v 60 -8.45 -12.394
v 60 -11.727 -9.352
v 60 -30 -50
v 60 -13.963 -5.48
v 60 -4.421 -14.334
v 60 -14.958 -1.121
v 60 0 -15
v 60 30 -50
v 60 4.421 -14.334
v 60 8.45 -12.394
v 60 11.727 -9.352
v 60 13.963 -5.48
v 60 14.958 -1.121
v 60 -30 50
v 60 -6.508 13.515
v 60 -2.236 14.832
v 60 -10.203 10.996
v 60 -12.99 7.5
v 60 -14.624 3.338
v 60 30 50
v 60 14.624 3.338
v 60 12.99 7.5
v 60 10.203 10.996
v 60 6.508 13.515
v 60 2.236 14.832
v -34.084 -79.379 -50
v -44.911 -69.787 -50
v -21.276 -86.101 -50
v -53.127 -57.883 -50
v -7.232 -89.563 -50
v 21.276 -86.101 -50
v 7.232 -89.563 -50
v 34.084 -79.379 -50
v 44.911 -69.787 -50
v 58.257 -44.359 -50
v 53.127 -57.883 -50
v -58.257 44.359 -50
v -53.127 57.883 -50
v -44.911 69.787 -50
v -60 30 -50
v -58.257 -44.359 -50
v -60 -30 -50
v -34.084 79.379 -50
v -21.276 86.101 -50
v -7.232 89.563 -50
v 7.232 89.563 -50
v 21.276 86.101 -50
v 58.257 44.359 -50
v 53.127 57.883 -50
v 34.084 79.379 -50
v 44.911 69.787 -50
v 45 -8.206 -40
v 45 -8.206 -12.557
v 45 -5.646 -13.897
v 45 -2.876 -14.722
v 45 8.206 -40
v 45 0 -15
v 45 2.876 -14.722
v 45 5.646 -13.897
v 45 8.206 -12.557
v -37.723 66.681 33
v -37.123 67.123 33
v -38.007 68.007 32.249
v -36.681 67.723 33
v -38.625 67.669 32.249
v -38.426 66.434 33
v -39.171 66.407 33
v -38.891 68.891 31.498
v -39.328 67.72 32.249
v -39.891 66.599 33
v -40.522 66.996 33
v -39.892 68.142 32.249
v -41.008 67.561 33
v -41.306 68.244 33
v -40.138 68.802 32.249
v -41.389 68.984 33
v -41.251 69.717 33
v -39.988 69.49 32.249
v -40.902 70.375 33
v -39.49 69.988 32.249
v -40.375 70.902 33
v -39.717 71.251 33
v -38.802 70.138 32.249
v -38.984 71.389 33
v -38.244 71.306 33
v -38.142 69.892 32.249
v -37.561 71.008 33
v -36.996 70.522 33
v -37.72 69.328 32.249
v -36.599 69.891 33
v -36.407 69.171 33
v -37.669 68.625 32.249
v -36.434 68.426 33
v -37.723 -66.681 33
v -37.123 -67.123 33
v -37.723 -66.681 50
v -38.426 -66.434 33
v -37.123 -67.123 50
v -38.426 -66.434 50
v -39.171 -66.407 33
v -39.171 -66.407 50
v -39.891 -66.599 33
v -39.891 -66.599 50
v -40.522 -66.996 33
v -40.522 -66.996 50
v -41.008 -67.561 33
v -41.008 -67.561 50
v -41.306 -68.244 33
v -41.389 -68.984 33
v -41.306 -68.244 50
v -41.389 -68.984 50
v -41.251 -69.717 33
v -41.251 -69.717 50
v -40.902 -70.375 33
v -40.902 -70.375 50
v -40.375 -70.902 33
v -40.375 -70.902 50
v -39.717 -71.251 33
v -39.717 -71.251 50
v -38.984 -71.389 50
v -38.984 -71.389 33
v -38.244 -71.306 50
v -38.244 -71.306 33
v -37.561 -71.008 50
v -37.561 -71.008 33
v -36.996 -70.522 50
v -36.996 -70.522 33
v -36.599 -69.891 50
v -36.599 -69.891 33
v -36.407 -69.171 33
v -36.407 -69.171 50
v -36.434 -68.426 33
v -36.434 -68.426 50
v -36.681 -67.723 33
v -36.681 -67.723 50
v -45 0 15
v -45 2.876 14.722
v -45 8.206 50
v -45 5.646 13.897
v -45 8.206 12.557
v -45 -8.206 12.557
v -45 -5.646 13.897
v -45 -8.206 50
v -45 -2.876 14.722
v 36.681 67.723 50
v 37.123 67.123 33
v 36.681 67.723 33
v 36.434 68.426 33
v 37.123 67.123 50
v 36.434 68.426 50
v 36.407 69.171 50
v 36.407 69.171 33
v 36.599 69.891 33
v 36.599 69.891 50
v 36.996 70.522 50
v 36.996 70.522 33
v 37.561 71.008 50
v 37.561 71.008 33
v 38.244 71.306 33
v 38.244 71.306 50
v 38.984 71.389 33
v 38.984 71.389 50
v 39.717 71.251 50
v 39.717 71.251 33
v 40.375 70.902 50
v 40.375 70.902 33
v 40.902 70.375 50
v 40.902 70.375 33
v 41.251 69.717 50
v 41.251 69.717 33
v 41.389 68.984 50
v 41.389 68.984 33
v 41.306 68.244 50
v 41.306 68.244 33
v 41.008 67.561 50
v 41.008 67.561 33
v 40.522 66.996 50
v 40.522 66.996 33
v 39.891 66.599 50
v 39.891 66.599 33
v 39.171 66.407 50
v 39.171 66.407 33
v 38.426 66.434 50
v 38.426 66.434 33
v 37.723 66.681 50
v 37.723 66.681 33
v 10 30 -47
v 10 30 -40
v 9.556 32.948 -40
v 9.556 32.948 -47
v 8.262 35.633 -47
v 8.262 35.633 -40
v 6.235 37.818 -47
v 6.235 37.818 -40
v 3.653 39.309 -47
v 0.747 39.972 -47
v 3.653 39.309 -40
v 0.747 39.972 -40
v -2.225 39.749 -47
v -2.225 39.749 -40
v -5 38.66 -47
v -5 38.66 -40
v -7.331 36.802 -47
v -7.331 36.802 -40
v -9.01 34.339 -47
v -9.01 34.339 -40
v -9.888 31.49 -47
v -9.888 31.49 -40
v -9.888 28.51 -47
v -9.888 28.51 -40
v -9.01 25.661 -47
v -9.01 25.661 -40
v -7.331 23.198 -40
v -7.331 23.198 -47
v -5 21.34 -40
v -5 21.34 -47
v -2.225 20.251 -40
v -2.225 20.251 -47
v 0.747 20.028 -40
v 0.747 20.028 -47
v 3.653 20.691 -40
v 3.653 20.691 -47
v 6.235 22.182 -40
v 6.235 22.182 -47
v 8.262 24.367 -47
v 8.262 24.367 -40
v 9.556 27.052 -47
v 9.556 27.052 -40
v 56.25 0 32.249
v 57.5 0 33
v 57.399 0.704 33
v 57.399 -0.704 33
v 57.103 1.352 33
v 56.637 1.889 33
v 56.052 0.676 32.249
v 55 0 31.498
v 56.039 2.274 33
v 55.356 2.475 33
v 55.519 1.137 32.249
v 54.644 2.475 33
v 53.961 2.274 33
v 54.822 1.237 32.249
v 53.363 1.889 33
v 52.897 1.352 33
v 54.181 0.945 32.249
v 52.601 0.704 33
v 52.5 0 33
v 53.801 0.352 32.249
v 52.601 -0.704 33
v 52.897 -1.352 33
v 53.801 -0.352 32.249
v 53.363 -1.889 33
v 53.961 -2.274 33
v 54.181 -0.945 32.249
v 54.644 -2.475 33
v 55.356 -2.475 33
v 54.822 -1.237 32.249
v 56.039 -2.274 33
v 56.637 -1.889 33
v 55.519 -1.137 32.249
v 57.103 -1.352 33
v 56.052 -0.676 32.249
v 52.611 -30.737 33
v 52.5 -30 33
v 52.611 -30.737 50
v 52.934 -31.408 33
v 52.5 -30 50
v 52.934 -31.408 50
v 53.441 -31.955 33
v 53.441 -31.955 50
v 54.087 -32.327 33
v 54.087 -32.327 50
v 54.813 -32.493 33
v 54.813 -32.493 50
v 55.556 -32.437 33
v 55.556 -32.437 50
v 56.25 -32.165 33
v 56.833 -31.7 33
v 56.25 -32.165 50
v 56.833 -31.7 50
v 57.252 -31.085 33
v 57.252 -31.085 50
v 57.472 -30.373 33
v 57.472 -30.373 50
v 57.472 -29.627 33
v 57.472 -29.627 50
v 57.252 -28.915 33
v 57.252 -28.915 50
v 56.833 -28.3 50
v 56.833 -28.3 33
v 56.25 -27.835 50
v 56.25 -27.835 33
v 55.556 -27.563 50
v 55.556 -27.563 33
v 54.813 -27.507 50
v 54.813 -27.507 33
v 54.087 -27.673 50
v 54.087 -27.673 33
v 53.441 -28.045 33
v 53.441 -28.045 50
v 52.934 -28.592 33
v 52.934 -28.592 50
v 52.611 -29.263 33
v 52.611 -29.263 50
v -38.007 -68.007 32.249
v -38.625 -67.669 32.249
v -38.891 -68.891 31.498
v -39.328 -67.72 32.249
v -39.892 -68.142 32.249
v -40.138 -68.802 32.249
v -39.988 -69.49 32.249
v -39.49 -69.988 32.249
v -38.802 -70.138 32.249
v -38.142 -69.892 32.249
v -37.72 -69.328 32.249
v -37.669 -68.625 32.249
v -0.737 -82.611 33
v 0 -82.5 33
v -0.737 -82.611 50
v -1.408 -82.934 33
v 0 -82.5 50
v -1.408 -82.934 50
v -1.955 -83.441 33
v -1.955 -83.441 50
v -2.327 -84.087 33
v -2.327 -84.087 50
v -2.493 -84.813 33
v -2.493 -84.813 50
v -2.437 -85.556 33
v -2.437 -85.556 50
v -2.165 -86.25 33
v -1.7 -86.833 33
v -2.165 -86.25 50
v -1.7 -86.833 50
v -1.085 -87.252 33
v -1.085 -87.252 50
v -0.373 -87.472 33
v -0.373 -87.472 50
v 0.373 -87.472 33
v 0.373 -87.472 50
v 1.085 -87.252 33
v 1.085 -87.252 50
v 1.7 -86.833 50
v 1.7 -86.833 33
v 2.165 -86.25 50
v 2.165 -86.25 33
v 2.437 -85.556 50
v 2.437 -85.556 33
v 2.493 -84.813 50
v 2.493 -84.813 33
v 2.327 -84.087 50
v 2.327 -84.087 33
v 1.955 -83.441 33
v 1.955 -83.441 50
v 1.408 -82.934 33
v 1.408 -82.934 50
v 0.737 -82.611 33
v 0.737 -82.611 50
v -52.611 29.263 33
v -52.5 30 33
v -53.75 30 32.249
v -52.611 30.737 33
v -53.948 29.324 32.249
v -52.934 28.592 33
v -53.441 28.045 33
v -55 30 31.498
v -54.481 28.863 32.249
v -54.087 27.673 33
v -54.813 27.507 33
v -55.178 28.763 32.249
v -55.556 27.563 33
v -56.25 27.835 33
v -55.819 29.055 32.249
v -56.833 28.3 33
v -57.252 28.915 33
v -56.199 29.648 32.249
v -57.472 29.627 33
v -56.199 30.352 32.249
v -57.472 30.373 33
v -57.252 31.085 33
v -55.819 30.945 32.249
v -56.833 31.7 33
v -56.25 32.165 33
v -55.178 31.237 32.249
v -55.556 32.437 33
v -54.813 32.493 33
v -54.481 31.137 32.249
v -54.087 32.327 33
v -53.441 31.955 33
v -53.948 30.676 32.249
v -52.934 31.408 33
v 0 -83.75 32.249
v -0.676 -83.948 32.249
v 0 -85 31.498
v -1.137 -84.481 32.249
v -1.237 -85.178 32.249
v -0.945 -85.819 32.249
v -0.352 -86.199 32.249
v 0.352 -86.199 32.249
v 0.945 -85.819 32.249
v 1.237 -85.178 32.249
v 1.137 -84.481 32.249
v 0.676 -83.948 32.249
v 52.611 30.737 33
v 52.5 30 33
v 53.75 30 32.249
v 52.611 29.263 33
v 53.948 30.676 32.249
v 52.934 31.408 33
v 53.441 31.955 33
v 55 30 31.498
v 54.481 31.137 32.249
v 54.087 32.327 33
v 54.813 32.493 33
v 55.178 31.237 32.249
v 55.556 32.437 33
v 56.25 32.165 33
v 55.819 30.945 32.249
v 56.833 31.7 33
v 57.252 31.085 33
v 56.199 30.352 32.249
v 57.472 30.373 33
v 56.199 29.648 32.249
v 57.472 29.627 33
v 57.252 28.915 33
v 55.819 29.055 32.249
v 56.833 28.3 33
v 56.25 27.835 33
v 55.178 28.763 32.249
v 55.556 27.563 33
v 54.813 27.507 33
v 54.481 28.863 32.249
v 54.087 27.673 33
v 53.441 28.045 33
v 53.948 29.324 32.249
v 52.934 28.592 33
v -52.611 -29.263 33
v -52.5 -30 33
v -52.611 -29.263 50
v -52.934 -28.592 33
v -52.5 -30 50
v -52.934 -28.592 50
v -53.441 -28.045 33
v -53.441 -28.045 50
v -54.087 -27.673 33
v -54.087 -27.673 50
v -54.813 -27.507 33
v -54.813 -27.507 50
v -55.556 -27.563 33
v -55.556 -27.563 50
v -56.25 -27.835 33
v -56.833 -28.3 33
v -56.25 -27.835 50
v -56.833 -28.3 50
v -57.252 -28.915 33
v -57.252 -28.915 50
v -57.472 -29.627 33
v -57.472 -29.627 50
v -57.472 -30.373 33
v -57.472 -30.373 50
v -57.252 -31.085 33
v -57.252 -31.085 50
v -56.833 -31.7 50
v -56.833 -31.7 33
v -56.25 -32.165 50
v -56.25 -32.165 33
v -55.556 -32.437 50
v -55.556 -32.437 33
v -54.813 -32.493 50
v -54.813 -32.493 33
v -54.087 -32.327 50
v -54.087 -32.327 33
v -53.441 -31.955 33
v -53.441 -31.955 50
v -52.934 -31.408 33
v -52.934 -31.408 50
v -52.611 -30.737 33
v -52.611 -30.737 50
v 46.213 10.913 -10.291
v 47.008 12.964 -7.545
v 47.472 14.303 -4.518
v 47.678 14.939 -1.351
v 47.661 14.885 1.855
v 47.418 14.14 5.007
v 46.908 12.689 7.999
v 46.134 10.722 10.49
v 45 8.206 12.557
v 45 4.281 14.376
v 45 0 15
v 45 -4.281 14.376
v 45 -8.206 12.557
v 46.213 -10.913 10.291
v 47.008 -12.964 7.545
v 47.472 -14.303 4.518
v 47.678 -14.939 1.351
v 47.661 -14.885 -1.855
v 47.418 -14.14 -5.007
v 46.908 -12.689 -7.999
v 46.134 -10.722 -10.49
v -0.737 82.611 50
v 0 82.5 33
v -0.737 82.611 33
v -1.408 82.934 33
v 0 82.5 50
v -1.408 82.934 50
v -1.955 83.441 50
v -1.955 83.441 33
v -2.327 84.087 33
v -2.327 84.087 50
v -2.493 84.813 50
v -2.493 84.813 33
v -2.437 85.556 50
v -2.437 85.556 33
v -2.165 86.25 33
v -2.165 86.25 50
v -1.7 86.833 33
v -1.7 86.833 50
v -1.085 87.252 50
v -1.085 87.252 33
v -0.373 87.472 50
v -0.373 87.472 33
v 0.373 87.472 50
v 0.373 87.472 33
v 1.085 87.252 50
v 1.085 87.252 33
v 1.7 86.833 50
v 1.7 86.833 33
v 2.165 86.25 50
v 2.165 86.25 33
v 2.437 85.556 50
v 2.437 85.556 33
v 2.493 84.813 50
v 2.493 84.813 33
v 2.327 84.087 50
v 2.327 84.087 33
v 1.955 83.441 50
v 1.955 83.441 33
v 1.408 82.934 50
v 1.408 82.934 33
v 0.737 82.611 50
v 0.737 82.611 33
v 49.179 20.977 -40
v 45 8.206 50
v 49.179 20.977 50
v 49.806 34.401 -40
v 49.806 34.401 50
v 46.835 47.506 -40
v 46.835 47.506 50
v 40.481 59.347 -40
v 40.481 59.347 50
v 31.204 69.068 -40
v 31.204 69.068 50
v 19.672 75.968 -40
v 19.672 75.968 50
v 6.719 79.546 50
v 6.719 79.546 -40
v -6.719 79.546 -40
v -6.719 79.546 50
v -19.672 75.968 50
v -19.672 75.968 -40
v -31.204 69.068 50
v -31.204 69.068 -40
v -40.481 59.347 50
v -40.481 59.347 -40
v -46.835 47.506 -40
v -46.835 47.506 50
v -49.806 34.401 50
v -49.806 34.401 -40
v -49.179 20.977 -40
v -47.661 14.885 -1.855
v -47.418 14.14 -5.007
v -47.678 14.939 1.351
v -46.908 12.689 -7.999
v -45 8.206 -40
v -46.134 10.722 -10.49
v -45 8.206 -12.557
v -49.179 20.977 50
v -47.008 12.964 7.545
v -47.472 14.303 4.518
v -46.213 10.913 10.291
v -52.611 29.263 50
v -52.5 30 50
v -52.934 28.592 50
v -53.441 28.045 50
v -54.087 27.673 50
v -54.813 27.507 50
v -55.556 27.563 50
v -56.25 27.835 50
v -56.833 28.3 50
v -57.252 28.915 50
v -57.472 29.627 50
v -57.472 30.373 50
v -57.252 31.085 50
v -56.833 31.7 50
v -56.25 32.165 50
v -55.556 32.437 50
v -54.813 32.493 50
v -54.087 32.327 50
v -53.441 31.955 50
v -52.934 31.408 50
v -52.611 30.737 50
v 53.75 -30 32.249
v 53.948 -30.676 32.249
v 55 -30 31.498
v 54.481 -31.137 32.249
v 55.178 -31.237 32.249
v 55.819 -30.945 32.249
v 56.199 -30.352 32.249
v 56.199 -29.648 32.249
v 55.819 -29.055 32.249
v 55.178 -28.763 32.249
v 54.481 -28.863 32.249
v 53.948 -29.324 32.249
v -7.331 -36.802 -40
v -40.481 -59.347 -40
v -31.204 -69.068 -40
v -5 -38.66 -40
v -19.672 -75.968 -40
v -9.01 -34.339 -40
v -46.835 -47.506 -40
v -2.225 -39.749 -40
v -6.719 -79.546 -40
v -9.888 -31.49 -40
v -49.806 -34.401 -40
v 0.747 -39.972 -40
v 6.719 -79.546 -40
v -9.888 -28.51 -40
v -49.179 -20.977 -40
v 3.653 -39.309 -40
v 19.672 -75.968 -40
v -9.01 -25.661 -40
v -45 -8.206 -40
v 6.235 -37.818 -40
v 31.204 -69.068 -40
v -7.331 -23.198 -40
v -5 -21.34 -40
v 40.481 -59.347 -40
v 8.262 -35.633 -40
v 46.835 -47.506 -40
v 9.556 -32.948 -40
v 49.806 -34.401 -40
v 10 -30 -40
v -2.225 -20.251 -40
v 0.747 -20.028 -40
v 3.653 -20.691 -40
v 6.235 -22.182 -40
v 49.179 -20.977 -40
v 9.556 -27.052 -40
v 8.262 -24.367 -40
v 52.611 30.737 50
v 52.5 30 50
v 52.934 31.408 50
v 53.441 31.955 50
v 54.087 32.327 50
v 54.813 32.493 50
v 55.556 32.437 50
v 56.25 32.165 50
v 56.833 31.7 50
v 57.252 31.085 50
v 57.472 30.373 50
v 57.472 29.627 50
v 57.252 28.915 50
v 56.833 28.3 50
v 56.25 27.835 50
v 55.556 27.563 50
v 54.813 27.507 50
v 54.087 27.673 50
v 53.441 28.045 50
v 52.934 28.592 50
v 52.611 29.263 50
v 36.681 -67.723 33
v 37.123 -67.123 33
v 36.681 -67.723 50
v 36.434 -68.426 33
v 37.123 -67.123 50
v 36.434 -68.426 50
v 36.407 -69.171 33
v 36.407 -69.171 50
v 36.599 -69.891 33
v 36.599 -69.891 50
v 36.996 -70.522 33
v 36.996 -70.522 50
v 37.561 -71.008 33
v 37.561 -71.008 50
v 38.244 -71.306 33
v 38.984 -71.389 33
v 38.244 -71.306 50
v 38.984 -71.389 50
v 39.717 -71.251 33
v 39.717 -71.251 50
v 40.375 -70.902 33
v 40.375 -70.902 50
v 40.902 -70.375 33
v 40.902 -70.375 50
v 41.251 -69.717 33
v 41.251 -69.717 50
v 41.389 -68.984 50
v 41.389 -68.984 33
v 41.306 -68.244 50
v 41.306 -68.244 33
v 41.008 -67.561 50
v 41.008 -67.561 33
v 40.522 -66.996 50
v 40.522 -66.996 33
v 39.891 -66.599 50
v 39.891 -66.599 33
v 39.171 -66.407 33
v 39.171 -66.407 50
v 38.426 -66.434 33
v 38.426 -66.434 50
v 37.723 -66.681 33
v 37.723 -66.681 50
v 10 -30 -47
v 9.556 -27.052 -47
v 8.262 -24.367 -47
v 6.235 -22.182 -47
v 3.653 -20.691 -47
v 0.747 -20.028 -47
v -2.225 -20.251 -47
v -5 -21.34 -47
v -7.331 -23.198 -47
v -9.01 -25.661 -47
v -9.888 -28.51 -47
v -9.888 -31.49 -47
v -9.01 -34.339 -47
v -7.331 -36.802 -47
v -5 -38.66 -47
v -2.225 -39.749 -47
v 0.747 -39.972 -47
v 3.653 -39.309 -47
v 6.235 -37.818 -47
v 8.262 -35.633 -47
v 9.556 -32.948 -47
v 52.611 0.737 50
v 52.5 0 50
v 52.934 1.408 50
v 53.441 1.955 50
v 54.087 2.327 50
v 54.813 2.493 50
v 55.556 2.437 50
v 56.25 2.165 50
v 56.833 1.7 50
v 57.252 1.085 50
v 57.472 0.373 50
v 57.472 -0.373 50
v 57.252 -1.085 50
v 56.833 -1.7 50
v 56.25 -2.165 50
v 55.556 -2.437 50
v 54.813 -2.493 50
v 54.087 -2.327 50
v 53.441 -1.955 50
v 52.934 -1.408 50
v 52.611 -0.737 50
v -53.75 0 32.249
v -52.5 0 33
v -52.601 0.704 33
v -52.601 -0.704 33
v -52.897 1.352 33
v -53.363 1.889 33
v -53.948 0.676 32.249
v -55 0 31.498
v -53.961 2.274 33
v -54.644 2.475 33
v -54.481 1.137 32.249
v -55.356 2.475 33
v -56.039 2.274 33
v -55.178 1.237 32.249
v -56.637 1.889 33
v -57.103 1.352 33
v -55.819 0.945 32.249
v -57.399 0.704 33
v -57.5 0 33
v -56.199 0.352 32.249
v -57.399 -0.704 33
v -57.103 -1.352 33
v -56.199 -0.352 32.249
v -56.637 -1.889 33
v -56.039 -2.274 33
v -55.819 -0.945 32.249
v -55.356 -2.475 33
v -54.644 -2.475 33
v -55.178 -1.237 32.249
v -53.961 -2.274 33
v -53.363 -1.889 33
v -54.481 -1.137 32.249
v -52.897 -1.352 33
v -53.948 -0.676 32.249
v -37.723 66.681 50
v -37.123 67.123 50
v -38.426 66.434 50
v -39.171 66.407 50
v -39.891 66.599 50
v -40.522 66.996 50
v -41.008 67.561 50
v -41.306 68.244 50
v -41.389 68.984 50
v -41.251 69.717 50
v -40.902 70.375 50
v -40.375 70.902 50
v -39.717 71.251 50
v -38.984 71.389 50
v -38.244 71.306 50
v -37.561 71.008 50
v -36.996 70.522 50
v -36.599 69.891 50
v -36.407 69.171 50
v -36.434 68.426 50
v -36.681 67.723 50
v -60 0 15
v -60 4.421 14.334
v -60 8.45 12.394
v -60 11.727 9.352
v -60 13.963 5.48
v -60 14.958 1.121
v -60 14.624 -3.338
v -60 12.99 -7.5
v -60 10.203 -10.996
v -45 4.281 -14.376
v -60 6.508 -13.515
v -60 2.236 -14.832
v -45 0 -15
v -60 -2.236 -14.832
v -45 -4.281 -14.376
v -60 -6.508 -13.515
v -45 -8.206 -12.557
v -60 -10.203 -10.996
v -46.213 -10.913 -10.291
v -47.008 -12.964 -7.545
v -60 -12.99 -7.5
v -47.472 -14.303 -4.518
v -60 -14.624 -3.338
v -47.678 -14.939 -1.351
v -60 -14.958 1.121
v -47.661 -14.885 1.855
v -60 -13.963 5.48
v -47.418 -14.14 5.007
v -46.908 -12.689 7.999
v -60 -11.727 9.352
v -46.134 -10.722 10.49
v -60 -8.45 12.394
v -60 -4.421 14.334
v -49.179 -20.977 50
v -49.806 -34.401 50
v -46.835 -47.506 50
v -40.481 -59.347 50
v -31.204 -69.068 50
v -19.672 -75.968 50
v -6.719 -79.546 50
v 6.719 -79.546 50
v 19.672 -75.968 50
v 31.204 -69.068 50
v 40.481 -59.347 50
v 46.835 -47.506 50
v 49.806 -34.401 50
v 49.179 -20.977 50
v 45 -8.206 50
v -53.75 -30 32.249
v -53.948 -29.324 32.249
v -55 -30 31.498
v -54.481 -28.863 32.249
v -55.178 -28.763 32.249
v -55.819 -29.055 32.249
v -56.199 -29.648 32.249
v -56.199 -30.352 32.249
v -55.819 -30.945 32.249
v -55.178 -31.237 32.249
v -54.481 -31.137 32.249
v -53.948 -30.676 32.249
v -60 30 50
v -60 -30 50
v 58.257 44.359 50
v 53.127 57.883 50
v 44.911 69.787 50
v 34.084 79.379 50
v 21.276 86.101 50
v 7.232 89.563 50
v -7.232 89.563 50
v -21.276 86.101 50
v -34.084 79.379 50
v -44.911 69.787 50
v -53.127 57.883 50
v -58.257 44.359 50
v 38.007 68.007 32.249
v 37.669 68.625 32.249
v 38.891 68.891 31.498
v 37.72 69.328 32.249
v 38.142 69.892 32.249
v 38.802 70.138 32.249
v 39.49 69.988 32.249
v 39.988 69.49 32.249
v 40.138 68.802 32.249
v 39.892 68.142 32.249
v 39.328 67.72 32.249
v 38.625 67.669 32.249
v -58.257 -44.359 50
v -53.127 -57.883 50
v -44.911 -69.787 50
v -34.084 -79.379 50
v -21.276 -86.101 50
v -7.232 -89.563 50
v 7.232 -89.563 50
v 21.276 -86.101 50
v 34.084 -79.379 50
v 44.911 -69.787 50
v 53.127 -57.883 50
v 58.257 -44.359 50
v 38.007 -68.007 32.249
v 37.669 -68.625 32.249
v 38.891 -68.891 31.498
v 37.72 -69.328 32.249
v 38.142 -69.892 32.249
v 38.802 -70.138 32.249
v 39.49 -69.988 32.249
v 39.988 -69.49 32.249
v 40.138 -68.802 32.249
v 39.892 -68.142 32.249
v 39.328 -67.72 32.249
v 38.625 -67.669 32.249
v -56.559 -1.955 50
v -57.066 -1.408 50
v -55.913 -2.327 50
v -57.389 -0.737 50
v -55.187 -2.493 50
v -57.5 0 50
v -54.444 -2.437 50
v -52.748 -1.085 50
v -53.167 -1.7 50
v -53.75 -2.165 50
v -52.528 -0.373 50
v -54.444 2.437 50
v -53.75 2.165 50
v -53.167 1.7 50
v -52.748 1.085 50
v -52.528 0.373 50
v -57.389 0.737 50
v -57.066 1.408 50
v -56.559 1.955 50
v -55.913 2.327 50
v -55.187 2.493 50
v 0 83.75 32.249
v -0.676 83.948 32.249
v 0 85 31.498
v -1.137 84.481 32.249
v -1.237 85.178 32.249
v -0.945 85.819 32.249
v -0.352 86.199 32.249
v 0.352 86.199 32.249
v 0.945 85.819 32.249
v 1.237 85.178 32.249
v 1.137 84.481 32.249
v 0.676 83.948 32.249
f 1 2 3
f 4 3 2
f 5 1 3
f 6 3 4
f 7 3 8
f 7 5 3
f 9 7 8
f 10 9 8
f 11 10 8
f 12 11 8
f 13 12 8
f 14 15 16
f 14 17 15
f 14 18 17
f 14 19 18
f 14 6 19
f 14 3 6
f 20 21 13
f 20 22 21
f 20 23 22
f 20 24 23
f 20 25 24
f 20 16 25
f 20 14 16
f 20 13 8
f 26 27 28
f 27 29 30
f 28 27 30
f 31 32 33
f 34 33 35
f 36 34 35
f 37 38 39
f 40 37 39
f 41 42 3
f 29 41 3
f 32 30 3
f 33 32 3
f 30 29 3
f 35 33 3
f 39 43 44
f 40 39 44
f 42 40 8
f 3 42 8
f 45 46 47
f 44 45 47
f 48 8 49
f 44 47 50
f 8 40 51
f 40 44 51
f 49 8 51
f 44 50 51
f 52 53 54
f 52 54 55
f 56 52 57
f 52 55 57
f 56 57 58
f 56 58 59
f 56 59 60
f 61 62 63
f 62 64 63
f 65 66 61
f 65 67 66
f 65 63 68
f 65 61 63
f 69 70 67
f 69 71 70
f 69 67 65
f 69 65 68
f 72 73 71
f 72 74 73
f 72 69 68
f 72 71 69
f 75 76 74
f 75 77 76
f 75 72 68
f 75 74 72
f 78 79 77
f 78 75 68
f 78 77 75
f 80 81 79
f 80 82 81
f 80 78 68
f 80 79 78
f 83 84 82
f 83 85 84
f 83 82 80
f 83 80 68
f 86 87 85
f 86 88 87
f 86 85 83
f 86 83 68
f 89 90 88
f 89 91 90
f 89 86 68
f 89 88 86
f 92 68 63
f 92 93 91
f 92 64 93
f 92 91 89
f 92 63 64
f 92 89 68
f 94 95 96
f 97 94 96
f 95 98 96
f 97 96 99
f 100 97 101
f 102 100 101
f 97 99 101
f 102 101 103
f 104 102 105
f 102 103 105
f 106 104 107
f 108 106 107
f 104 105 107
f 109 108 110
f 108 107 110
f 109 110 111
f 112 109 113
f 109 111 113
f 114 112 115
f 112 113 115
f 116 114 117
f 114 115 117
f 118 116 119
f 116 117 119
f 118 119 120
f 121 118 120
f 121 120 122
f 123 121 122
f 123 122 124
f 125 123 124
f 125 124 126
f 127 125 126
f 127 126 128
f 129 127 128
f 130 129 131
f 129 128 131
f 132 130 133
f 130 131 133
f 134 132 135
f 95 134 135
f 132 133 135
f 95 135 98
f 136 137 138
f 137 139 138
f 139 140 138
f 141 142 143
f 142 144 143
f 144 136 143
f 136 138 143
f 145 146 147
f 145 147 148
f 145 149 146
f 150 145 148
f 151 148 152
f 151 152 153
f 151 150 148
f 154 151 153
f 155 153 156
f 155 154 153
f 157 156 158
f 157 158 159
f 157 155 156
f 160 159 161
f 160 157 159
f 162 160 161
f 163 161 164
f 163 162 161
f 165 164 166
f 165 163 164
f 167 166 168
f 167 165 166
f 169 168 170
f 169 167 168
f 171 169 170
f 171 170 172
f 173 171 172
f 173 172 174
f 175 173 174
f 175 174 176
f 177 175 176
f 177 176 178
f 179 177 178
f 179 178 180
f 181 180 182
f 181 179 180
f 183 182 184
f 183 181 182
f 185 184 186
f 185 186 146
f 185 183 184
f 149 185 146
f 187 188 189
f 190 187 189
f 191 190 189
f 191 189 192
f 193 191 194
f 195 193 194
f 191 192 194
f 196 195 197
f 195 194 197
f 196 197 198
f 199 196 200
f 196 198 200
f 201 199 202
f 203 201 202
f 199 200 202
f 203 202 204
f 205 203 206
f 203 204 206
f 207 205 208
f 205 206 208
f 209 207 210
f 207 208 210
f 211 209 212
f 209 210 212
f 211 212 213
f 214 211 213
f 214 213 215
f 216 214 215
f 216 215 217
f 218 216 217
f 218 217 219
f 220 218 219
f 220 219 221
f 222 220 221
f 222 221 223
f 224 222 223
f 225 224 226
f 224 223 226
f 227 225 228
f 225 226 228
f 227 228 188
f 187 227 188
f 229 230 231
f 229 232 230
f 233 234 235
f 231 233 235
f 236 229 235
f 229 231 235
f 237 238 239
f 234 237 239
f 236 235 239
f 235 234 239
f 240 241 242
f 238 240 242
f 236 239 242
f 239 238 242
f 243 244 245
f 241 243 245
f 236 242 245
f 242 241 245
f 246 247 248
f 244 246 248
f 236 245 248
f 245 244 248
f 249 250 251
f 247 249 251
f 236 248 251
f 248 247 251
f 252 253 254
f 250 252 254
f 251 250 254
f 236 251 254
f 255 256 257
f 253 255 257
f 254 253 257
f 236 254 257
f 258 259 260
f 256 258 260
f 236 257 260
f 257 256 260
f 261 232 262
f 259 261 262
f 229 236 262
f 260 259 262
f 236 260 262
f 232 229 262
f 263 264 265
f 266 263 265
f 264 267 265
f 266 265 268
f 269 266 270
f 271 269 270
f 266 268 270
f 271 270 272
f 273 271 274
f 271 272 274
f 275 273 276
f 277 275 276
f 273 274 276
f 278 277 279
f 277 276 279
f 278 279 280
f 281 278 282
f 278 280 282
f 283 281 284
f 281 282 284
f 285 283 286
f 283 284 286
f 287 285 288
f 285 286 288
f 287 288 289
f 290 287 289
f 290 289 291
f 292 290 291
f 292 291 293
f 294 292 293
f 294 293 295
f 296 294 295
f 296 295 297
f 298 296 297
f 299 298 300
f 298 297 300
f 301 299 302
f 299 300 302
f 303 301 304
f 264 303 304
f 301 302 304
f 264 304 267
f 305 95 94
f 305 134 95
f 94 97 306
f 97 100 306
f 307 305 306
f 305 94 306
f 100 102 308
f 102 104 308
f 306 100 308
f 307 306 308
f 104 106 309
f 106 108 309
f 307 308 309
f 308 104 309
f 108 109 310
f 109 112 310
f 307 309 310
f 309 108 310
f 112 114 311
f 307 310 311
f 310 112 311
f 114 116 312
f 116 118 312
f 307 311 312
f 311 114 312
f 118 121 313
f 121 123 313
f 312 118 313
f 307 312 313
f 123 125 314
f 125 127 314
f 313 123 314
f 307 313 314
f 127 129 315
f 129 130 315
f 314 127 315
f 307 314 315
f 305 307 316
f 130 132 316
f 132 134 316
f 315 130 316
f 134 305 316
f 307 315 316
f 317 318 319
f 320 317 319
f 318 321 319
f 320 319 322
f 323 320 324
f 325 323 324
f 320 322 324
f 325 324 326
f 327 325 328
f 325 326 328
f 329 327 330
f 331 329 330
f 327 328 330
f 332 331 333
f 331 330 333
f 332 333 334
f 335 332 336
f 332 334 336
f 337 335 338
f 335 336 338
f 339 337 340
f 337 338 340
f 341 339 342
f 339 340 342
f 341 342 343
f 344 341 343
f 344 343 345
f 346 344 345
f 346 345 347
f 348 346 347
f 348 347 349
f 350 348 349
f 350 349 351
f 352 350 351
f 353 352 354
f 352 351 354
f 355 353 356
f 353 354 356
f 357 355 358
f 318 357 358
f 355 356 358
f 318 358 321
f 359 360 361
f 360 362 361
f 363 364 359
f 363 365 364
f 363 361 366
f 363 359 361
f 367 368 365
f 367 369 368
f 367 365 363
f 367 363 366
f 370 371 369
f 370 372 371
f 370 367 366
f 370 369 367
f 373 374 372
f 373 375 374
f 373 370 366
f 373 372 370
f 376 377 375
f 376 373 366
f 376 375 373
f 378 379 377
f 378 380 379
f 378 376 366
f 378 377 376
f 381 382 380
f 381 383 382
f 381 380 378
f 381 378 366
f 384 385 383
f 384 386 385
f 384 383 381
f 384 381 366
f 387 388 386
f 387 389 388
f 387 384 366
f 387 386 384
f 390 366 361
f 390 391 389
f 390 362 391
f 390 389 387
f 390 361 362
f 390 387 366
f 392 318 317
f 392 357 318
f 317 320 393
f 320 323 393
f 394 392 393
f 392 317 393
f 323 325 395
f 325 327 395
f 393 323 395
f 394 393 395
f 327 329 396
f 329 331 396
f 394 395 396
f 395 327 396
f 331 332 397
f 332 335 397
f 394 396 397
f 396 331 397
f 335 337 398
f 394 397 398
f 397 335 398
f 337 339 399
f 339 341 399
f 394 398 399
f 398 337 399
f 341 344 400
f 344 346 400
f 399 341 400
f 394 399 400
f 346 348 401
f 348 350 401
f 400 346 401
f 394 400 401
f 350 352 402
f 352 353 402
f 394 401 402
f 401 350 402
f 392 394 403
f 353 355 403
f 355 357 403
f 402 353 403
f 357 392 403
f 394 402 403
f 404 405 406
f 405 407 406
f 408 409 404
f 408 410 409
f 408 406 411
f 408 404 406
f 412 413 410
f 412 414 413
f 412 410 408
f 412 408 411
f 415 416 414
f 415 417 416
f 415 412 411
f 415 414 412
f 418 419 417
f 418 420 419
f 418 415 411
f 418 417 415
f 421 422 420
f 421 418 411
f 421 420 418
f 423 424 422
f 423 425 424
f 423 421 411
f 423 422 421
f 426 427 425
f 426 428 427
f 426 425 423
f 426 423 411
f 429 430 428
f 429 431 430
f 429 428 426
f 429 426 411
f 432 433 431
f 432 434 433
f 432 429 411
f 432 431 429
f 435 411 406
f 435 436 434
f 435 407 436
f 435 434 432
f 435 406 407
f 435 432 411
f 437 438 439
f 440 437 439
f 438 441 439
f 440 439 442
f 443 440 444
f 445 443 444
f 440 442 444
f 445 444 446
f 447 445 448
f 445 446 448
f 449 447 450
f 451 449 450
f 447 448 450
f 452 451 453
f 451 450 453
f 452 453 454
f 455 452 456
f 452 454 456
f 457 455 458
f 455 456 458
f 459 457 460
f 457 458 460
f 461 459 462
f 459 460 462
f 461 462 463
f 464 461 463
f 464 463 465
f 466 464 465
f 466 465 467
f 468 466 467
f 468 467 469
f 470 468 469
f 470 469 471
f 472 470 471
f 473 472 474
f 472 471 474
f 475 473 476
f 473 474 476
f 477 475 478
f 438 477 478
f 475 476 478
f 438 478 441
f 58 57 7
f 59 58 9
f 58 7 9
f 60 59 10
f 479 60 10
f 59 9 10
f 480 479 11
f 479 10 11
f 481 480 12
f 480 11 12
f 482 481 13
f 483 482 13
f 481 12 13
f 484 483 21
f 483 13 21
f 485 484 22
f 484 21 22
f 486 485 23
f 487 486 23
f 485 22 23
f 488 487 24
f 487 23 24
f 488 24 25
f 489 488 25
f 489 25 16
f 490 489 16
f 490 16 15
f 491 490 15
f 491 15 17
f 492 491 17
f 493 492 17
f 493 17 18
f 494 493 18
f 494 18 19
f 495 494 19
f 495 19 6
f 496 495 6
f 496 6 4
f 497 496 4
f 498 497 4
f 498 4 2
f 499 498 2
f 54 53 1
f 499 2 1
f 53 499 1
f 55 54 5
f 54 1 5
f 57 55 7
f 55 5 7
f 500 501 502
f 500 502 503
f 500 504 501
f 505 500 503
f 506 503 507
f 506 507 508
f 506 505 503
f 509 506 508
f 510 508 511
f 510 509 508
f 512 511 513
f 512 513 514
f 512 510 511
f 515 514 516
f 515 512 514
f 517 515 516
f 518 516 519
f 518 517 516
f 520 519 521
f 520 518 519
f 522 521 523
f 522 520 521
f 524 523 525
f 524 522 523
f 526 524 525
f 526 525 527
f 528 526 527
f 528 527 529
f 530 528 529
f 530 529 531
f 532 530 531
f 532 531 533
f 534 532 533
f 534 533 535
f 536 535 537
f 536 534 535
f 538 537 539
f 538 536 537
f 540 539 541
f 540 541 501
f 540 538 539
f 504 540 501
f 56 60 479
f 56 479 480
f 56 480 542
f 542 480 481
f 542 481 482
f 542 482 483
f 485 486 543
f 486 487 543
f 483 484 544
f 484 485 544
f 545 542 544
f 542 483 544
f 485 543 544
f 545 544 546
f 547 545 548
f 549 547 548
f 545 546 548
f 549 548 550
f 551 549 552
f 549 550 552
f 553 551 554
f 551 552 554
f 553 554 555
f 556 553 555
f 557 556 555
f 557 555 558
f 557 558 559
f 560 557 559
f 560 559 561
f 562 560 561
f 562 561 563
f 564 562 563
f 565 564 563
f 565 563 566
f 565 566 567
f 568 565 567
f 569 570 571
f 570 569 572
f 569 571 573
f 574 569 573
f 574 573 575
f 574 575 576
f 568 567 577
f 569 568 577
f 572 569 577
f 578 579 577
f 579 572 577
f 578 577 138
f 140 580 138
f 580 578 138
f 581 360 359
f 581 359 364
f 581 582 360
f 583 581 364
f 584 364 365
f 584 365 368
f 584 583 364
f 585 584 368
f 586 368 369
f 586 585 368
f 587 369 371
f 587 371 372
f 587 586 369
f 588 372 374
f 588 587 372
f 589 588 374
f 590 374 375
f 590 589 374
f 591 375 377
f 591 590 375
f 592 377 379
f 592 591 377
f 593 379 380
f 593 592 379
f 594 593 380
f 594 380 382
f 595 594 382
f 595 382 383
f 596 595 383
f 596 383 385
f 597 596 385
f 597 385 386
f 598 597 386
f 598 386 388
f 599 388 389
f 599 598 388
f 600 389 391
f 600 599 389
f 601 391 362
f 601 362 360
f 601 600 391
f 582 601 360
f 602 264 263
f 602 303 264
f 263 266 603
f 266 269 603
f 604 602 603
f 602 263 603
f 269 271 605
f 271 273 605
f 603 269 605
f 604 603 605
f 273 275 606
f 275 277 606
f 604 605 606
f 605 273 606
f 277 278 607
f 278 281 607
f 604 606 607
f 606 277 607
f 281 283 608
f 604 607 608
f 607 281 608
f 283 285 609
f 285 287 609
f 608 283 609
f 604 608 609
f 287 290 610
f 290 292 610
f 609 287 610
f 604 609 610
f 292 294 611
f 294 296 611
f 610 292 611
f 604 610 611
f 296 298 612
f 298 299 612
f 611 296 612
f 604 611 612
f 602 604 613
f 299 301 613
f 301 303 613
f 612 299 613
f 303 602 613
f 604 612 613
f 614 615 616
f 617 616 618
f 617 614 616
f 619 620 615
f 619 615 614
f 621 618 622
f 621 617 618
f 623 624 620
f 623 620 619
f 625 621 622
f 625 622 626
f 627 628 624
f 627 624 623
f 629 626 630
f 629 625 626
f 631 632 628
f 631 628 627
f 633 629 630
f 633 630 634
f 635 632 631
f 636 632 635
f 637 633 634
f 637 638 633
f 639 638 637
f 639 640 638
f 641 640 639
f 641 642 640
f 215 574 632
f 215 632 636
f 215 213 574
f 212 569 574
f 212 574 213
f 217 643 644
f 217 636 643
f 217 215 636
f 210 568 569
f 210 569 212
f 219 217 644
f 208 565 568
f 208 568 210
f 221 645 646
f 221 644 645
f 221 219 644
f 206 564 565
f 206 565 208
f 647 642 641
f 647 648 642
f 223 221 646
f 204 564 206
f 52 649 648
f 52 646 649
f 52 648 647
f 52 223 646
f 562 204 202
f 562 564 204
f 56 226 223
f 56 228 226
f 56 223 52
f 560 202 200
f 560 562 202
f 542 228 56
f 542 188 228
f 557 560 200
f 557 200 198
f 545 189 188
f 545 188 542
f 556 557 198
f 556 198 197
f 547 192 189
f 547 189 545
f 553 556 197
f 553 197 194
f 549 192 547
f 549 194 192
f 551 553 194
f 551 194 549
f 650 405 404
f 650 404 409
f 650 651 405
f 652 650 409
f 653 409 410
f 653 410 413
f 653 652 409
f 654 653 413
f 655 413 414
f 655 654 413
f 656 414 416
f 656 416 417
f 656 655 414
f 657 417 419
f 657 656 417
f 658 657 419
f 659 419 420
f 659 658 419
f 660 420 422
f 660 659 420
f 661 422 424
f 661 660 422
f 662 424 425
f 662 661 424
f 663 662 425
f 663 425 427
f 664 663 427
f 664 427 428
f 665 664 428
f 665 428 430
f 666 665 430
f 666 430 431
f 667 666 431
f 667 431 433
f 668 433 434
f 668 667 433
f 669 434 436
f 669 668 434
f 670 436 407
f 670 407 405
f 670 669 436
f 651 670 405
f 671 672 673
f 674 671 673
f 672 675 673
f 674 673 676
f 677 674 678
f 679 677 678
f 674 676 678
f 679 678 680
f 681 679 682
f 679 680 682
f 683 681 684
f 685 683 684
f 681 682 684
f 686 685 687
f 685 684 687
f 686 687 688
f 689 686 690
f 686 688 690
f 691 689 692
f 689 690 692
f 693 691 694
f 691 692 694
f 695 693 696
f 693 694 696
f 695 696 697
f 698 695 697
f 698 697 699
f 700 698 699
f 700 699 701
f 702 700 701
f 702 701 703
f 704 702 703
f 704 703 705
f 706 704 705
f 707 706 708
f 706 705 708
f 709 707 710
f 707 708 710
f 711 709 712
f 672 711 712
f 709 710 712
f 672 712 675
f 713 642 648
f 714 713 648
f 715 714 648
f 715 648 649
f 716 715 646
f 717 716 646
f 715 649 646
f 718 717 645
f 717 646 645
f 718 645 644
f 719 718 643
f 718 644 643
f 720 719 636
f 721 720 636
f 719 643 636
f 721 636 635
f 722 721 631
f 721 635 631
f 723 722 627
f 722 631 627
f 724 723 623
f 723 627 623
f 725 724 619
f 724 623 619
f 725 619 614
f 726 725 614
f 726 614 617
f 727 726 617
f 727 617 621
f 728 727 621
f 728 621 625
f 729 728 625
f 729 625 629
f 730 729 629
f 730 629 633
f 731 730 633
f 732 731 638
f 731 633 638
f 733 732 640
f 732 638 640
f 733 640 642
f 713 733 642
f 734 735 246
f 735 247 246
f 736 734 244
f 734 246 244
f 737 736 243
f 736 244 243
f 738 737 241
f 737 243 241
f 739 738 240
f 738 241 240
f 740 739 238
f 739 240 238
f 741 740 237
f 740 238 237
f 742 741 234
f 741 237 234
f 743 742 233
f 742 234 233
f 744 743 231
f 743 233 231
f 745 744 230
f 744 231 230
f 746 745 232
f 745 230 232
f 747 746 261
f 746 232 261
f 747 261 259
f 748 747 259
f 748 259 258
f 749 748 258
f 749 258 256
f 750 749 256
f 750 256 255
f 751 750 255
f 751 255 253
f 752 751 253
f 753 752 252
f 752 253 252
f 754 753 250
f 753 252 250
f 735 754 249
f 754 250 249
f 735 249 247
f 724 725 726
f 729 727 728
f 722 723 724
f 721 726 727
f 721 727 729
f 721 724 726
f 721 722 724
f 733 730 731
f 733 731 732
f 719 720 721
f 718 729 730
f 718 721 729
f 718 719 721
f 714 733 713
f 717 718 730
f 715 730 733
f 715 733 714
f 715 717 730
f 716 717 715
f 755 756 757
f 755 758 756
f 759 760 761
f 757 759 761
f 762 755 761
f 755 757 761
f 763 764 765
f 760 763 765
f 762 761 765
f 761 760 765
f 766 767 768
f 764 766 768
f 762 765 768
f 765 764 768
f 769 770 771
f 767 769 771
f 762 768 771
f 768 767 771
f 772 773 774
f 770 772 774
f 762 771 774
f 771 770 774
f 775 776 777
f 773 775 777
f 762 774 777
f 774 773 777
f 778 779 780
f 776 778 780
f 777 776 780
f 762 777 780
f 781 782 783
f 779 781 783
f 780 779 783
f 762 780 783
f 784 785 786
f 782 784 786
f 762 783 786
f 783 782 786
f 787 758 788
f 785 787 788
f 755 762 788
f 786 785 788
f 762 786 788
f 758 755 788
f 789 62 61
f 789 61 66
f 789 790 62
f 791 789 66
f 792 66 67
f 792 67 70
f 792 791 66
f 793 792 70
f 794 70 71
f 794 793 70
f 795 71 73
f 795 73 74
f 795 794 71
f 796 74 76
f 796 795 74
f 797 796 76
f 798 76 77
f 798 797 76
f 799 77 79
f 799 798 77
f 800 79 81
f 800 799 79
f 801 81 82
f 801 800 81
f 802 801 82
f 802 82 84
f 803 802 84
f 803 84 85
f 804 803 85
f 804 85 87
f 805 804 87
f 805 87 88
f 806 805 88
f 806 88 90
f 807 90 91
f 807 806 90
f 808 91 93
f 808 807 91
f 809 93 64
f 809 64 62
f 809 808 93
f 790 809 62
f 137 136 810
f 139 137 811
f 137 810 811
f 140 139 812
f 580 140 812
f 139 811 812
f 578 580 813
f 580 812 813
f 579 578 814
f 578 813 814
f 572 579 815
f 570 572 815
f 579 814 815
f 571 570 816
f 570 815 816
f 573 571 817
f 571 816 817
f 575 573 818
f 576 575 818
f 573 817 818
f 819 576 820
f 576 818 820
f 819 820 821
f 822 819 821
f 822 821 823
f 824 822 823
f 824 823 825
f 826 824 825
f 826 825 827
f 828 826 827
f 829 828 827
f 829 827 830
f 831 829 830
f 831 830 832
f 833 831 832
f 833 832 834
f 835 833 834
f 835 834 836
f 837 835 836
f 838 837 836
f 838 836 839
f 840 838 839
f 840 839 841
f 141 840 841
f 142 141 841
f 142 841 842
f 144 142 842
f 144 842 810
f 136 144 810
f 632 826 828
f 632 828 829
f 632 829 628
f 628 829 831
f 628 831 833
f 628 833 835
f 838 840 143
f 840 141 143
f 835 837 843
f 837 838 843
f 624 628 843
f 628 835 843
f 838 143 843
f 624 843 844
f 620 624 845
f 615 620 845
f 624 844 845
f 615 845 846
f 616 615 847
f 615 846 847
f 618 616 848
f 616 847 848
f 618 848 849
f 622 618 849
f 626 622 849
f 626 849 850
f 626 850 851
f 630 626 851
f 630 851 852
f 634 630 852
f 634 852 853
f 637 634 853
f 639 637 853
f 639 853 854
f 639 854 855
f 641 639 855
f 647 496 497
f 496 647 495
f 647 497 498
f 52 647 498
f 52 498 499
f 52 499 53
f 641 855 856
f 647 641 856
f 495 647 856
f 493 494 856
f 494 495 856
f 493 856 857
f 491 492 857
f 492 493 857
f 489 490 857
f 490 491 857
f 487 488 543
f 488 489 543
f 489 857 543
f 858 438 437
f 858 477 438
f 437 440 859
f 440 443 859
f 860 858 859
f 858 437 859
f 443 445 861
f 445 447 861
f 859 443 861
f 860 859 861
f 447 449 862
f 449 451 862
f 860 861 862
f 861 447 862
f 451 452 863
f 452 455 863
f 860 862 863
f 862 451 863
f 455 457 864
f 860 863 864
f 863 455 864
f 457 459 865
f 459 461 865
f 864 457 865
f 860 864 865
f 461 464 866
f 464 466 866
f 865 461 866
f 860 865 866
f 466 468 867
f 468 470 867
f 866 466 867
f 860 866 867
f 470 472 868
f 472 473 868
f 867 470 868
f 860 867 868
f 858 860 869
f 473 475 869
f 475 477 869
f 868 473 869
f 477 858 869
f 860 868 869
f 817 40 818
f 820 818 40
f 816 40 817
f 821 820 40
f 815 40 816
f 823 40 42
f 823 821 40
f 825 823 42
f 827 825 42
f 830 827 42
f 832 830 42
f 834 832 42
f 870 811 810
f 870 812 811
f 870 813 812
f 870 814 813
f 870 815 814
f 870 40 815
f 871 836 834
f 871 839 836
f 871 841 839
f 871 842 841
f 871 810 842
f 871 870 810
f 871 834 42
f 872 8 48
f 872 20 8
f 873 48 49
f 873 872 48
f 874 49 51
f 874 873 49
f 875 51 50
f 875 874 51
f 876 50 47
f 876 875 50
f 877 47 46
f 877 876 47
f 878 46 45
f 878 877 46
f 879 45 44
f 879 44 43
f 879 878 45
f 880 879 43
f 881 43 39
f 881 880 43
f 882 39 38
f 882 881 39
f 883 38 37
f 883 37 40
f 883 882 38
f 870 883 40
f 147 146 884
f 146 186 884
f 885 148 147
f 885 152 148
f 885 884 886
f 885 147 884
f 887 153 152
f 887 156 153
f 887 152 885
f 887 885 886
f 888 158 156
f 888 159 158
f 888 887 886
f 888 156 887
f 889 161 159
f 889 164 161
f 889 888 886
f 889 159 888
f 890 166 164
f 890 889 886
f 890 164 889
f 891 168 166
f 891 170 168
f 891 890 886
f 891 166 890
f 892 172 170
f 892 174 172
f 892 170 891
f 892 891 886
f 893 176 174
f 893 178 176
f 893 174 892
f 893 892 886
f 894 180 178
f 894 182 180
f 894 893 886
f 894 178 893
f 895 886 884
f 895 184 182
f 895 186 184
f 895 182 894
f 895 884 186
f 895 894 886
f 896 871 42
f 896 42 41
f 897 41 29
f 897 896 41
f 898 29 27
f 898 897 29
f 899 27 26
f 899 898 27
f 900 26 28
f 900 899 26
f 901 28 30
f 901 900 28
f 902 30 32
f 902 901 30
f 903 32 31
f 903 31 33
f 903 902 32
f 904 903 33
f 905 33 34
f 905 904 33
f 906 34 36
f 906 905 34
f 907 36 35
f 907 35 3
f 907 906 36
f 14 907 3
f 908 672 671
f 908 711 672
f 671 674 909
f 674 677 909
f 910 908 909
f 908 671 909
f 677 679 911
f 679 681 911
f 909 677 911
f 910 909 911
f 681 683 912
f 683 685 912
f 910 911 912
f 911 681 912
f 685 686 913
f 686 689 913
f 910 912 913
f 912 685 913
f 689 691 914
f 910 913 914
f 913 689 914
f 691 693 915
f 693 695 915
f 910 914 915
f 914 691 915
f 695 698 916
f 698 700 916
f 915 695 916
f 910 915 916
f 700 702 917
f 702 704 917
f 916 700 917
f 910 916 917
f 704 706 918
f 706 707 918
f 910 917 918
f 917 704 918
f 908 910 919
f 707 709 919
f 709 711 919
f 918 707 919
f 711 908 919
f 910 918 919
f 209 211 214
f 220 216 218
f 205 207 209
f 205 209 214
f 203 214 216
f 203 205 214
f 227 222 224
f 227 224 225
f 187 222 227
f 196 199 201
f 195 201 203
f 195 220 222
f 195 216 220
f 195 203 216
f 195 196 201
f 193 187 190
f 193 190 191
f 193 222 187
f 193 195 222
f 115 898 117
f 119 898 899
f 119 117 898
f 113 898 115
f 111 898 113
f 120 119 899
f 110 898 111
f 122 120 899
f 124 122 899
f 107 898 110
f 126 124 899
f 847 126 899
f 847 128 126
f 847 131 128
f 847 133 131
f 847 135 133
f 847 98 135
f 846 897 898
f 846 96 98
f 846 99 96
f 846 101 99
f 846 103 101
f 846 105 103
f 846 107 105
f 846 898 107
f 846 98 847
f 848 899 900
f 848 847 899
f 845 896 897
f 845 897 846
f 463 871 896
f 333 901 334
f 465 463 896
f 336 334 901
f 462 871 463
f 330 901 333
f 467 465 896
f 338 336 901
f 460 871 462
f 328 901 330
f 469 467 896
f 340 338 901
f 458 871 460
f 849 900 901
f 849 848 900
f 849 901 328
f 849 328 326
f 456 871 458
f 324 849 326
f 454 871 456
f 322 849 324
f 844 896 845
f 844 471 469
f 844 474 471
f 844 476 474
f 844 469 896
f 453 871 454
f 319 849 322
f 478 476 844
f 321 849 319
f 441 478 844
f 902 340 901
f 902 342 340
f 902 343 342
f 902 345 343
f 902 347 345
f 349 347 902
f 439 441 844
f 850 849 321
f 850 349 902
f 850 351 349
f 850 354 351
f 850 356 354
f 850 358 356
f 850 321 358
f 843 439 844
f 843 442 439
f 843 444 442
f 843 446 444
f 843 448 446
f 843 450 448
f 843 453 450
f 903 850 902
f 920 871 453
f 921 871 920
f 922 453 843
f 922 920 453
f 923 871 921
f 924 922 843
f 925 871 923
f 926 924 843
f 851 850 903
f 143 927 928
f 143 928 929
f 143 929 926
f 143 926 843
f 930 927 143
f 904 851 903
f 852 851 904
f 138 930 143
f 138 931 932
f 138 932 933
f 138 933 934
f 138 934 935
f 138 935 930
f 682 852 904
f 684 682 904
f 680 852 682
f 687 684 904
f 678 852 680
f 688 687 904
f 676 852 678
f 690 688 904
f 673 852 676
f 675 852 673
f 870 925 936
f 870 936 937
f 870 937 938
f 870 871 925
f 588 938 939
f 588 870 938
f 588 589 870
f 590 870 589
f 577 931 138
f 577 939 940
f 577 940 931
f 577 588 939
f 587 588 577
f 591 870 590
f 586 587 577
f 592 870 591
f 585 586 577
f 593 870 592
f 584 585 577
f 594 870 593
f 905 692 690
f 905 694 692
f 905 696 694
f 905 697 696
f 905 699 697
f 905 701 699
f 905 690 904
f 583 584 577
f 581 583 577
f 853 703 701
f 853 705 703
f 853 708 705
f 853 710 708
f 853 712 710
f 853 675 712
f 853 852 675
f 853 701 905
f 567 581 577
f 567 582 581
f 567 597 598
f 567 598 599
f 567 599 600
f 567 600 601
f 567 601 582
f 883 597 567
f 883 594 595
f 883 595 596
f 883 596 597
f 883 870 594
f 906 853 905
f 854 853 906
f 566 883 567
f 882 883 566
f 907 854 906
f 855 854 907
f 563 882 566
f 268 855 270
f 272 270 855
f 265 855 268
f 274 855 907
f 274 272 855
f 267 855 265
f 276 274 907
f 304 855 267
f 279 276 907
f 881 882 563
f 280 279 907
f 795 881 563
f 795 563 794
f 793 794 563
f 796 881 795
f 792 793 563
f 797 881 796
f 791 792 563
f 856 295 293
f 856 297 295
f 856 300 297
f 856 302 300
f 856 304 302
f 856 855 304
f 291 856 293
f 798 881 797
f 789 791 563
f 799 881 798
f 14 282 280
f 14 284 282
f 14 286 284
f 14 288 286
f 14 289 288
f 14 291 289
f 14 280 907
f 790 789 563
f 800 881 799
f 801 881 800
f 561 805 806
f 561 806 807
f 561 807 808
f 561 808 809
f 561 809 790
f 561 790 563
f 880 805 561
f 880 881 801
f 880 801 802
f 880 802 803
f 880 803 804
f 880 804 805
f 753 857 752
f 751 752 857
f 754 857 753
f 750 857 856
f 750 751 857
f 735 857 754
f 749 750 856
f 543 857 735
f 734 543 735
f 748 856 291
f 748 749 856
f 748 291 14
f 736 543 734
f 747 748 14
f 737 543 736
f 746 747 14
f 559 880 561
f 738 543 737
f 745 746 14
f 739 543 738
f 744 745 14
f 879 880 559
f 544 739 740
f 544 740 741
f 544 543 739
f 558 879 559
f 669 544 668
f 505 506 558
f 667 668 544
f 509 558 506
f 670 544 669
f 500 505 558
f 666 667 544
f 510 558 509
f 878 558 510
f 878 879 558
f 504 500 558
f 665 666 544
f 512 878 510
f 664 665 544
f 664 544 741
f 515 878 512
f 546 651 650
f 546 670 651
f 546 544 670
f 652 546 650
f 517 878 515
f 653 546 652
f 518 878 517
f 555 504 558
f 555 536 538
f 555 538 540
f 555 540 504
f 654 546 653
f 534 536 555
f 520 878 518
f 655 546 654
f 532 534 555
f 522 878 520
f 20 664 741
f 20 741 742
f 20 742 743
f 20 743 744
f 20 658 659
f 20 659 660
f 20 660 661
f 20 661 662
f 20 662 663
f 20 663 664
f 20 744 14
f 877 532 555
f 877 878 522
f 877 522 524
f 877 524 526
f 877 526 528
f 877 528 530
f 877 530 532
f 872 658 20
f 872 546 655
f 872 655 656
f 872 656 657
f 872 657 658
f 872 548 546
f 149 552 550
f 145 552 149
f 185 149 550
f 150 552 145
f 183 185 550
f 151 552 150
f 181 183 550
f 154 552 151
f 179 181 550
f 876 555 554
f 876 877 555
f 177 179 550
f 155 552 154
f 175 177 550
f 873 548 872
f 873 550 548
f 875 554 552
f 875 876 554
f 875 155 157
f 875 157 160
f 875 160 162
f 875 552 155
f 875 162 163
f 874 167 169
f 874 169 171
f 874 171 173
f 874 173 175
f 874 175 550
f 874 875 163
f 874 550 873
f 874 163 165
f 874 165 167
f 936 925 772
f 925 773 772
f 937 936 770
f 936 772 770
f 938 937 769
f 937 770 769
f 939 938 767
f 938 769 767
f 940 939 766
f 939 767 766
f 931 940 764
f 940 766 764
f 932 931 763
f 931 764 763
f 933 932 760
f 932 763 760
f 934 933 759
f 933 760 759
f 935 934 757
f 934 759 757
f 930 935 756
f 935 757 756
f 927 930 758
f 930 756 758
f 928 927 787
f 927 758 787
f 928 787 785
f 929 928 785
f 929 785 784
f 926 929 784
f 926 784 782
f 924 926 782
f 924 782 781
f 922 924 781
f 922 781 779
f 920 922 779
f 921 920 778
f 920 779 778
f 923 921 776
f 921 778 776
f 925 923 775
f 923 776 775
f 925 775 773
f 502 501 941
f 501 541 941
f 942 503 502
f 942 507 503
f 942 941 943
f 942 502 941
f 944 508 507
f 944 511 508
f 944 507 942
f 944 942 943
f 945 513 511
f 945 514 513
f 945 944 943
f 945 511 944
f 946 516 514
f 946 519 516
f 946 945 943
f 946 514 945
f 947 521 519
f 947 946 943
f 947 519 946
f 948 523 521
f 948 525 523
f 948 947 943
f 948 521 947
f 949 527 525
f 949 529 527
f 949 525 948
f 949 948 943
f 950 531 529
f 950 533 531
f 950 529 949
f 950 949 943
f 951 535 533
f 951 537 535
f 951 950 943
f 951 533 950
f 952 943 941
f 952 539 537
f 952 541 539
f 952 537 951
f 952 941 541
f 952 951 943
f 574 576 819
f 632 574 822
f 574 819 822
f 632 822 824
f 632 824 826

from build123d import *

# Parameters (mm, degrees)
OUTER_HOUSING_EXTRUDE_DEPTH            = 50
INNER_HOUSING_CUT_DEPTH                = 90
SKETCH3_R                              = 10
SHAFT_BEARING_INSERT_HOLE_DEPTH        = 7
HIGH_PRESSURE_OUTLET_HOLE_REACH        = 122
SKETCH4_R                              = 15
LOW_PRESSURE_INLET_HOLE_REACH          = 122
SKETCH5_R                              = 15
HOUSING_COVER_TOP_FASTENER_HOLES_COUNT = 8
M6X1_0_TAPPED_HOLE2_D                  = 5
M6X1_0_TAPPED_HOLE2_DEPTH              = 17
M6X1_0_TAPPED_HOLE2_TIP                = 1.502151548


with BuildPart() as part:
    # Sketch1 → Outer Housing Extrude (new body, symmetric)
    with BuildSketch(Plane.XY):
        with BuildLine():
            Line((-60, 30), (-60, -30))
            ThreePointArc((-60, -30), (0, -90), (60, -30))
            Line((60, -30), (60, 30))
            ThreePointArc((60, 30), (0, 90), (-60, 30))
        make_face()
    extrude(amount=OUTER_HOUSING_EXTRUDE_DEPTH, both=True)

    # Sketch2 → Inner Housing Cut (cut)
    with BuildSketch(Plane.XY.offset(50)):
        with BuildLine():
            Line((-45, 8.205505282), (-45, -8.205505282))
            ThreePointArc((-45, -8.205505282), (0, -80), (45, -8.205505282))
            Line((45, -8.205505282), (45, 8.205505282))
            ThreePointArc((45, 8.205505282), (0, 80), (-45, 8.205505282))
        make_face()
    extrude(amount=-INNER_HOUSING_CUT_DEPTH, mode=Mode.SUBTRACT)

    # Sketch3 → Shaft Bearing Insert Hole (cut)
    with BuildSketch(Plane.XY.offset(-40)):
        with Locations((0, 30)):
            Circle(SKETCH3_R)
        with Locations((0, -30)):
            Circle(SKETCH3_R)
    extrude(amount=-SHAFT_BEARING_INSERT_HOLE_DEPTH, mode=Mode.SUBTRACT)

    # Sketch4 → High Pressure Outlet Hole (cut, up to next)
    with BuildSketch(Plane.ZY.offset(60), mode=Mode.PRIVATE) as high_pressure_outlet_hole_sk1:
        Circle(SKETCH4_R)
    high_pressure_outlet_hole_tool1 = extrude(high_pressure_outlet_hole_sk1.sketch, amount=-HIGH_PRESSURE_OUTLET_HOLE_REACH, mode=Mode.PRIVATE) & part.part
    add(high_pressure_outlet_hole_tool1.solids().sort_by_distance((-60, 0, 0))[0], mode=Mode.SUBTRACT)

    # Sketch5 → Low Pressure Inlet Hole (cut, up to next)
    with BuildSketch(Plane(origin=(60, 0, 0), x_dir=(0, 0, -1), z_dir=(1, 0, 0)), mode=Mode.PRIVATE) as low_pressure_inlet_hole_sk1:
        Circle(SKETCH5_R)
    low_pressure_inlet_hole_tool1 = extrude(low_pressure_inlet_hole_sk1.sketch, amount=-LOW_PRESSURE_INLET_HOLE_REACH, mode=Mode.PRIVATE) & part.part
    add(low_pressure_inlet_hole_tool1.solids().sort_by_distance((60, 0, 0))[0], mode=Mode.SUBTRACT)

    # Sketch7 → M6x1.0 Tapped Hole1 (revolve, cut)
    with BuildSketch(Plane(origin=(0, 85, 50), x_dir=(0, -1, 0), z_dir=(1, 0, 0))):
        Polygon((0, 0), (0, 18.502151548), (2.5, 17), (2.5, 0), align=None)
    m6x1_0_tapped_hole1 = revolve(axis=Axis((0, 85, 56.35), (0, 0, -1)), mode=Mode.SUBTRACT)

    # Housing Cover Top Fastener Holes: M6x1.0 Tapped Hole1 ×8 about axis, 3 skipped
    housing_cover_top_fastener_holes_axis = Axis((0, 30, 0), (0, 0, 1))
    add([m6x1_0_tapped_hole1.rotate(housing_cover_top_fastener_holes_axis, i * 360 / HOUSING_COVER_TOP_FASTENER_HOLES_COUNT) for i in range(1, HOUSING_COVER_TOP_FASTENER_HOLES_COUNT) if i not in (3, 4, 5)], mode=Mode.SUBTRACT)

    # Housing Cover Bottom Fastener Holes: M6x1.0 Tapped Hole1 across plane
    add(m6x1_0_tapped_hole1.mirror(Plane.ZX), mode=Mode.SUBTRACT)

    # Housing Cover Bottom Fastener Holes copy → Housing Cover Bottom Fastener Holes  2 (revolve, cut)
    with BuildSketch(Plane(origin=(-38.890872965, -68.890872965, 50), x_dir=(0.707106781, 0.707106781, 0), z_dir=(0.707106781, -0.707106781, 0))):
        Polygon((0, 0), (0, -18.502151548), (2.5, -17), (2.5, 0), align=None)
    revolve(axis=Axis((-38.890872965, -68.890872965, 56.35), (0, 0, 1)), mode=Mode.SUBTRACT)

    # Housing Cover Bottom Fastener Holes  3 → Housing Cover Bottom Fastener Holes  4 (revolve, cut)
    with BuildSketch(Plane(origin=(-55, -30, 50), x_dir=(1, 0, 0), z_dir=(0, -1, 0))):
        Polygon((0, 0), (0, -18.502151548), (2.5, -17), (2.5, 0), align=None)
    revolve(axis=Axis((-55, -30, 56.35), (0, 0, 1)), mode=Mode.SUBTRACT)

    # Housing Cover Bottom Fastener Holes  5 → Housing Cover Bottom Fastener Holes  6 (revolve, cut)
    with BuildSketch(Plane(origin=(55, -30, 50), x_dir=(-1, 0, 0), z_dir=(0, 1, 0))):
        Polygon((0, 0), (0, -18.502151548), (2.5, -17), (2.5, 0), align=None)
    revolve(axis=Axis((55, -30, 56.35), (0, 0, 1)), mode=Mode.SUBTRACT)

    # Housing Cover Bottom Fastener Holes  7 → Housing Cover Bottom Fastener Holes  8 (revolve, cut)
    with BuildSketch(Plane(origin=(38.890872965, -68.890872965, 50), x_dir=(-0.707106781, 0.707106781, 0), z_dir=(0.707106781, 0.707106781, 0))):
        Polygon((0, 0), (0, -18.502151548), (2.5, -17), (2.5, 0), align=None)
    revolve(axis=Axis((38.890872965, -68.890872965, 56.35), (0, 0, 1)), mode=Mode.SUBTRACT)

    # M6x1.0 Tapped Hole2
    with Locations(Plane.XY.offset(50)):
        with Locations((-55, 0), (55, 0)):
            Hole(M6X1_0_TAPPED_HOLE2_D / 2, depth=M6X1_0_TAPPED_HOLE2_DEPTH)
            with Locations((0, 0, -(M6X1_0_TAPPED_HOLE2_DEPTH + M6X1_0_TAPPED_HOLE2_TIP / 2))):  # 118° drill point
                Cone(0, M6X1_0_TAPPED_HOLE2_D / 2, M6X1_0_TAPPED_HOLE2_TIP, mode=Mode.SUBTRACT)


solid = part.part
